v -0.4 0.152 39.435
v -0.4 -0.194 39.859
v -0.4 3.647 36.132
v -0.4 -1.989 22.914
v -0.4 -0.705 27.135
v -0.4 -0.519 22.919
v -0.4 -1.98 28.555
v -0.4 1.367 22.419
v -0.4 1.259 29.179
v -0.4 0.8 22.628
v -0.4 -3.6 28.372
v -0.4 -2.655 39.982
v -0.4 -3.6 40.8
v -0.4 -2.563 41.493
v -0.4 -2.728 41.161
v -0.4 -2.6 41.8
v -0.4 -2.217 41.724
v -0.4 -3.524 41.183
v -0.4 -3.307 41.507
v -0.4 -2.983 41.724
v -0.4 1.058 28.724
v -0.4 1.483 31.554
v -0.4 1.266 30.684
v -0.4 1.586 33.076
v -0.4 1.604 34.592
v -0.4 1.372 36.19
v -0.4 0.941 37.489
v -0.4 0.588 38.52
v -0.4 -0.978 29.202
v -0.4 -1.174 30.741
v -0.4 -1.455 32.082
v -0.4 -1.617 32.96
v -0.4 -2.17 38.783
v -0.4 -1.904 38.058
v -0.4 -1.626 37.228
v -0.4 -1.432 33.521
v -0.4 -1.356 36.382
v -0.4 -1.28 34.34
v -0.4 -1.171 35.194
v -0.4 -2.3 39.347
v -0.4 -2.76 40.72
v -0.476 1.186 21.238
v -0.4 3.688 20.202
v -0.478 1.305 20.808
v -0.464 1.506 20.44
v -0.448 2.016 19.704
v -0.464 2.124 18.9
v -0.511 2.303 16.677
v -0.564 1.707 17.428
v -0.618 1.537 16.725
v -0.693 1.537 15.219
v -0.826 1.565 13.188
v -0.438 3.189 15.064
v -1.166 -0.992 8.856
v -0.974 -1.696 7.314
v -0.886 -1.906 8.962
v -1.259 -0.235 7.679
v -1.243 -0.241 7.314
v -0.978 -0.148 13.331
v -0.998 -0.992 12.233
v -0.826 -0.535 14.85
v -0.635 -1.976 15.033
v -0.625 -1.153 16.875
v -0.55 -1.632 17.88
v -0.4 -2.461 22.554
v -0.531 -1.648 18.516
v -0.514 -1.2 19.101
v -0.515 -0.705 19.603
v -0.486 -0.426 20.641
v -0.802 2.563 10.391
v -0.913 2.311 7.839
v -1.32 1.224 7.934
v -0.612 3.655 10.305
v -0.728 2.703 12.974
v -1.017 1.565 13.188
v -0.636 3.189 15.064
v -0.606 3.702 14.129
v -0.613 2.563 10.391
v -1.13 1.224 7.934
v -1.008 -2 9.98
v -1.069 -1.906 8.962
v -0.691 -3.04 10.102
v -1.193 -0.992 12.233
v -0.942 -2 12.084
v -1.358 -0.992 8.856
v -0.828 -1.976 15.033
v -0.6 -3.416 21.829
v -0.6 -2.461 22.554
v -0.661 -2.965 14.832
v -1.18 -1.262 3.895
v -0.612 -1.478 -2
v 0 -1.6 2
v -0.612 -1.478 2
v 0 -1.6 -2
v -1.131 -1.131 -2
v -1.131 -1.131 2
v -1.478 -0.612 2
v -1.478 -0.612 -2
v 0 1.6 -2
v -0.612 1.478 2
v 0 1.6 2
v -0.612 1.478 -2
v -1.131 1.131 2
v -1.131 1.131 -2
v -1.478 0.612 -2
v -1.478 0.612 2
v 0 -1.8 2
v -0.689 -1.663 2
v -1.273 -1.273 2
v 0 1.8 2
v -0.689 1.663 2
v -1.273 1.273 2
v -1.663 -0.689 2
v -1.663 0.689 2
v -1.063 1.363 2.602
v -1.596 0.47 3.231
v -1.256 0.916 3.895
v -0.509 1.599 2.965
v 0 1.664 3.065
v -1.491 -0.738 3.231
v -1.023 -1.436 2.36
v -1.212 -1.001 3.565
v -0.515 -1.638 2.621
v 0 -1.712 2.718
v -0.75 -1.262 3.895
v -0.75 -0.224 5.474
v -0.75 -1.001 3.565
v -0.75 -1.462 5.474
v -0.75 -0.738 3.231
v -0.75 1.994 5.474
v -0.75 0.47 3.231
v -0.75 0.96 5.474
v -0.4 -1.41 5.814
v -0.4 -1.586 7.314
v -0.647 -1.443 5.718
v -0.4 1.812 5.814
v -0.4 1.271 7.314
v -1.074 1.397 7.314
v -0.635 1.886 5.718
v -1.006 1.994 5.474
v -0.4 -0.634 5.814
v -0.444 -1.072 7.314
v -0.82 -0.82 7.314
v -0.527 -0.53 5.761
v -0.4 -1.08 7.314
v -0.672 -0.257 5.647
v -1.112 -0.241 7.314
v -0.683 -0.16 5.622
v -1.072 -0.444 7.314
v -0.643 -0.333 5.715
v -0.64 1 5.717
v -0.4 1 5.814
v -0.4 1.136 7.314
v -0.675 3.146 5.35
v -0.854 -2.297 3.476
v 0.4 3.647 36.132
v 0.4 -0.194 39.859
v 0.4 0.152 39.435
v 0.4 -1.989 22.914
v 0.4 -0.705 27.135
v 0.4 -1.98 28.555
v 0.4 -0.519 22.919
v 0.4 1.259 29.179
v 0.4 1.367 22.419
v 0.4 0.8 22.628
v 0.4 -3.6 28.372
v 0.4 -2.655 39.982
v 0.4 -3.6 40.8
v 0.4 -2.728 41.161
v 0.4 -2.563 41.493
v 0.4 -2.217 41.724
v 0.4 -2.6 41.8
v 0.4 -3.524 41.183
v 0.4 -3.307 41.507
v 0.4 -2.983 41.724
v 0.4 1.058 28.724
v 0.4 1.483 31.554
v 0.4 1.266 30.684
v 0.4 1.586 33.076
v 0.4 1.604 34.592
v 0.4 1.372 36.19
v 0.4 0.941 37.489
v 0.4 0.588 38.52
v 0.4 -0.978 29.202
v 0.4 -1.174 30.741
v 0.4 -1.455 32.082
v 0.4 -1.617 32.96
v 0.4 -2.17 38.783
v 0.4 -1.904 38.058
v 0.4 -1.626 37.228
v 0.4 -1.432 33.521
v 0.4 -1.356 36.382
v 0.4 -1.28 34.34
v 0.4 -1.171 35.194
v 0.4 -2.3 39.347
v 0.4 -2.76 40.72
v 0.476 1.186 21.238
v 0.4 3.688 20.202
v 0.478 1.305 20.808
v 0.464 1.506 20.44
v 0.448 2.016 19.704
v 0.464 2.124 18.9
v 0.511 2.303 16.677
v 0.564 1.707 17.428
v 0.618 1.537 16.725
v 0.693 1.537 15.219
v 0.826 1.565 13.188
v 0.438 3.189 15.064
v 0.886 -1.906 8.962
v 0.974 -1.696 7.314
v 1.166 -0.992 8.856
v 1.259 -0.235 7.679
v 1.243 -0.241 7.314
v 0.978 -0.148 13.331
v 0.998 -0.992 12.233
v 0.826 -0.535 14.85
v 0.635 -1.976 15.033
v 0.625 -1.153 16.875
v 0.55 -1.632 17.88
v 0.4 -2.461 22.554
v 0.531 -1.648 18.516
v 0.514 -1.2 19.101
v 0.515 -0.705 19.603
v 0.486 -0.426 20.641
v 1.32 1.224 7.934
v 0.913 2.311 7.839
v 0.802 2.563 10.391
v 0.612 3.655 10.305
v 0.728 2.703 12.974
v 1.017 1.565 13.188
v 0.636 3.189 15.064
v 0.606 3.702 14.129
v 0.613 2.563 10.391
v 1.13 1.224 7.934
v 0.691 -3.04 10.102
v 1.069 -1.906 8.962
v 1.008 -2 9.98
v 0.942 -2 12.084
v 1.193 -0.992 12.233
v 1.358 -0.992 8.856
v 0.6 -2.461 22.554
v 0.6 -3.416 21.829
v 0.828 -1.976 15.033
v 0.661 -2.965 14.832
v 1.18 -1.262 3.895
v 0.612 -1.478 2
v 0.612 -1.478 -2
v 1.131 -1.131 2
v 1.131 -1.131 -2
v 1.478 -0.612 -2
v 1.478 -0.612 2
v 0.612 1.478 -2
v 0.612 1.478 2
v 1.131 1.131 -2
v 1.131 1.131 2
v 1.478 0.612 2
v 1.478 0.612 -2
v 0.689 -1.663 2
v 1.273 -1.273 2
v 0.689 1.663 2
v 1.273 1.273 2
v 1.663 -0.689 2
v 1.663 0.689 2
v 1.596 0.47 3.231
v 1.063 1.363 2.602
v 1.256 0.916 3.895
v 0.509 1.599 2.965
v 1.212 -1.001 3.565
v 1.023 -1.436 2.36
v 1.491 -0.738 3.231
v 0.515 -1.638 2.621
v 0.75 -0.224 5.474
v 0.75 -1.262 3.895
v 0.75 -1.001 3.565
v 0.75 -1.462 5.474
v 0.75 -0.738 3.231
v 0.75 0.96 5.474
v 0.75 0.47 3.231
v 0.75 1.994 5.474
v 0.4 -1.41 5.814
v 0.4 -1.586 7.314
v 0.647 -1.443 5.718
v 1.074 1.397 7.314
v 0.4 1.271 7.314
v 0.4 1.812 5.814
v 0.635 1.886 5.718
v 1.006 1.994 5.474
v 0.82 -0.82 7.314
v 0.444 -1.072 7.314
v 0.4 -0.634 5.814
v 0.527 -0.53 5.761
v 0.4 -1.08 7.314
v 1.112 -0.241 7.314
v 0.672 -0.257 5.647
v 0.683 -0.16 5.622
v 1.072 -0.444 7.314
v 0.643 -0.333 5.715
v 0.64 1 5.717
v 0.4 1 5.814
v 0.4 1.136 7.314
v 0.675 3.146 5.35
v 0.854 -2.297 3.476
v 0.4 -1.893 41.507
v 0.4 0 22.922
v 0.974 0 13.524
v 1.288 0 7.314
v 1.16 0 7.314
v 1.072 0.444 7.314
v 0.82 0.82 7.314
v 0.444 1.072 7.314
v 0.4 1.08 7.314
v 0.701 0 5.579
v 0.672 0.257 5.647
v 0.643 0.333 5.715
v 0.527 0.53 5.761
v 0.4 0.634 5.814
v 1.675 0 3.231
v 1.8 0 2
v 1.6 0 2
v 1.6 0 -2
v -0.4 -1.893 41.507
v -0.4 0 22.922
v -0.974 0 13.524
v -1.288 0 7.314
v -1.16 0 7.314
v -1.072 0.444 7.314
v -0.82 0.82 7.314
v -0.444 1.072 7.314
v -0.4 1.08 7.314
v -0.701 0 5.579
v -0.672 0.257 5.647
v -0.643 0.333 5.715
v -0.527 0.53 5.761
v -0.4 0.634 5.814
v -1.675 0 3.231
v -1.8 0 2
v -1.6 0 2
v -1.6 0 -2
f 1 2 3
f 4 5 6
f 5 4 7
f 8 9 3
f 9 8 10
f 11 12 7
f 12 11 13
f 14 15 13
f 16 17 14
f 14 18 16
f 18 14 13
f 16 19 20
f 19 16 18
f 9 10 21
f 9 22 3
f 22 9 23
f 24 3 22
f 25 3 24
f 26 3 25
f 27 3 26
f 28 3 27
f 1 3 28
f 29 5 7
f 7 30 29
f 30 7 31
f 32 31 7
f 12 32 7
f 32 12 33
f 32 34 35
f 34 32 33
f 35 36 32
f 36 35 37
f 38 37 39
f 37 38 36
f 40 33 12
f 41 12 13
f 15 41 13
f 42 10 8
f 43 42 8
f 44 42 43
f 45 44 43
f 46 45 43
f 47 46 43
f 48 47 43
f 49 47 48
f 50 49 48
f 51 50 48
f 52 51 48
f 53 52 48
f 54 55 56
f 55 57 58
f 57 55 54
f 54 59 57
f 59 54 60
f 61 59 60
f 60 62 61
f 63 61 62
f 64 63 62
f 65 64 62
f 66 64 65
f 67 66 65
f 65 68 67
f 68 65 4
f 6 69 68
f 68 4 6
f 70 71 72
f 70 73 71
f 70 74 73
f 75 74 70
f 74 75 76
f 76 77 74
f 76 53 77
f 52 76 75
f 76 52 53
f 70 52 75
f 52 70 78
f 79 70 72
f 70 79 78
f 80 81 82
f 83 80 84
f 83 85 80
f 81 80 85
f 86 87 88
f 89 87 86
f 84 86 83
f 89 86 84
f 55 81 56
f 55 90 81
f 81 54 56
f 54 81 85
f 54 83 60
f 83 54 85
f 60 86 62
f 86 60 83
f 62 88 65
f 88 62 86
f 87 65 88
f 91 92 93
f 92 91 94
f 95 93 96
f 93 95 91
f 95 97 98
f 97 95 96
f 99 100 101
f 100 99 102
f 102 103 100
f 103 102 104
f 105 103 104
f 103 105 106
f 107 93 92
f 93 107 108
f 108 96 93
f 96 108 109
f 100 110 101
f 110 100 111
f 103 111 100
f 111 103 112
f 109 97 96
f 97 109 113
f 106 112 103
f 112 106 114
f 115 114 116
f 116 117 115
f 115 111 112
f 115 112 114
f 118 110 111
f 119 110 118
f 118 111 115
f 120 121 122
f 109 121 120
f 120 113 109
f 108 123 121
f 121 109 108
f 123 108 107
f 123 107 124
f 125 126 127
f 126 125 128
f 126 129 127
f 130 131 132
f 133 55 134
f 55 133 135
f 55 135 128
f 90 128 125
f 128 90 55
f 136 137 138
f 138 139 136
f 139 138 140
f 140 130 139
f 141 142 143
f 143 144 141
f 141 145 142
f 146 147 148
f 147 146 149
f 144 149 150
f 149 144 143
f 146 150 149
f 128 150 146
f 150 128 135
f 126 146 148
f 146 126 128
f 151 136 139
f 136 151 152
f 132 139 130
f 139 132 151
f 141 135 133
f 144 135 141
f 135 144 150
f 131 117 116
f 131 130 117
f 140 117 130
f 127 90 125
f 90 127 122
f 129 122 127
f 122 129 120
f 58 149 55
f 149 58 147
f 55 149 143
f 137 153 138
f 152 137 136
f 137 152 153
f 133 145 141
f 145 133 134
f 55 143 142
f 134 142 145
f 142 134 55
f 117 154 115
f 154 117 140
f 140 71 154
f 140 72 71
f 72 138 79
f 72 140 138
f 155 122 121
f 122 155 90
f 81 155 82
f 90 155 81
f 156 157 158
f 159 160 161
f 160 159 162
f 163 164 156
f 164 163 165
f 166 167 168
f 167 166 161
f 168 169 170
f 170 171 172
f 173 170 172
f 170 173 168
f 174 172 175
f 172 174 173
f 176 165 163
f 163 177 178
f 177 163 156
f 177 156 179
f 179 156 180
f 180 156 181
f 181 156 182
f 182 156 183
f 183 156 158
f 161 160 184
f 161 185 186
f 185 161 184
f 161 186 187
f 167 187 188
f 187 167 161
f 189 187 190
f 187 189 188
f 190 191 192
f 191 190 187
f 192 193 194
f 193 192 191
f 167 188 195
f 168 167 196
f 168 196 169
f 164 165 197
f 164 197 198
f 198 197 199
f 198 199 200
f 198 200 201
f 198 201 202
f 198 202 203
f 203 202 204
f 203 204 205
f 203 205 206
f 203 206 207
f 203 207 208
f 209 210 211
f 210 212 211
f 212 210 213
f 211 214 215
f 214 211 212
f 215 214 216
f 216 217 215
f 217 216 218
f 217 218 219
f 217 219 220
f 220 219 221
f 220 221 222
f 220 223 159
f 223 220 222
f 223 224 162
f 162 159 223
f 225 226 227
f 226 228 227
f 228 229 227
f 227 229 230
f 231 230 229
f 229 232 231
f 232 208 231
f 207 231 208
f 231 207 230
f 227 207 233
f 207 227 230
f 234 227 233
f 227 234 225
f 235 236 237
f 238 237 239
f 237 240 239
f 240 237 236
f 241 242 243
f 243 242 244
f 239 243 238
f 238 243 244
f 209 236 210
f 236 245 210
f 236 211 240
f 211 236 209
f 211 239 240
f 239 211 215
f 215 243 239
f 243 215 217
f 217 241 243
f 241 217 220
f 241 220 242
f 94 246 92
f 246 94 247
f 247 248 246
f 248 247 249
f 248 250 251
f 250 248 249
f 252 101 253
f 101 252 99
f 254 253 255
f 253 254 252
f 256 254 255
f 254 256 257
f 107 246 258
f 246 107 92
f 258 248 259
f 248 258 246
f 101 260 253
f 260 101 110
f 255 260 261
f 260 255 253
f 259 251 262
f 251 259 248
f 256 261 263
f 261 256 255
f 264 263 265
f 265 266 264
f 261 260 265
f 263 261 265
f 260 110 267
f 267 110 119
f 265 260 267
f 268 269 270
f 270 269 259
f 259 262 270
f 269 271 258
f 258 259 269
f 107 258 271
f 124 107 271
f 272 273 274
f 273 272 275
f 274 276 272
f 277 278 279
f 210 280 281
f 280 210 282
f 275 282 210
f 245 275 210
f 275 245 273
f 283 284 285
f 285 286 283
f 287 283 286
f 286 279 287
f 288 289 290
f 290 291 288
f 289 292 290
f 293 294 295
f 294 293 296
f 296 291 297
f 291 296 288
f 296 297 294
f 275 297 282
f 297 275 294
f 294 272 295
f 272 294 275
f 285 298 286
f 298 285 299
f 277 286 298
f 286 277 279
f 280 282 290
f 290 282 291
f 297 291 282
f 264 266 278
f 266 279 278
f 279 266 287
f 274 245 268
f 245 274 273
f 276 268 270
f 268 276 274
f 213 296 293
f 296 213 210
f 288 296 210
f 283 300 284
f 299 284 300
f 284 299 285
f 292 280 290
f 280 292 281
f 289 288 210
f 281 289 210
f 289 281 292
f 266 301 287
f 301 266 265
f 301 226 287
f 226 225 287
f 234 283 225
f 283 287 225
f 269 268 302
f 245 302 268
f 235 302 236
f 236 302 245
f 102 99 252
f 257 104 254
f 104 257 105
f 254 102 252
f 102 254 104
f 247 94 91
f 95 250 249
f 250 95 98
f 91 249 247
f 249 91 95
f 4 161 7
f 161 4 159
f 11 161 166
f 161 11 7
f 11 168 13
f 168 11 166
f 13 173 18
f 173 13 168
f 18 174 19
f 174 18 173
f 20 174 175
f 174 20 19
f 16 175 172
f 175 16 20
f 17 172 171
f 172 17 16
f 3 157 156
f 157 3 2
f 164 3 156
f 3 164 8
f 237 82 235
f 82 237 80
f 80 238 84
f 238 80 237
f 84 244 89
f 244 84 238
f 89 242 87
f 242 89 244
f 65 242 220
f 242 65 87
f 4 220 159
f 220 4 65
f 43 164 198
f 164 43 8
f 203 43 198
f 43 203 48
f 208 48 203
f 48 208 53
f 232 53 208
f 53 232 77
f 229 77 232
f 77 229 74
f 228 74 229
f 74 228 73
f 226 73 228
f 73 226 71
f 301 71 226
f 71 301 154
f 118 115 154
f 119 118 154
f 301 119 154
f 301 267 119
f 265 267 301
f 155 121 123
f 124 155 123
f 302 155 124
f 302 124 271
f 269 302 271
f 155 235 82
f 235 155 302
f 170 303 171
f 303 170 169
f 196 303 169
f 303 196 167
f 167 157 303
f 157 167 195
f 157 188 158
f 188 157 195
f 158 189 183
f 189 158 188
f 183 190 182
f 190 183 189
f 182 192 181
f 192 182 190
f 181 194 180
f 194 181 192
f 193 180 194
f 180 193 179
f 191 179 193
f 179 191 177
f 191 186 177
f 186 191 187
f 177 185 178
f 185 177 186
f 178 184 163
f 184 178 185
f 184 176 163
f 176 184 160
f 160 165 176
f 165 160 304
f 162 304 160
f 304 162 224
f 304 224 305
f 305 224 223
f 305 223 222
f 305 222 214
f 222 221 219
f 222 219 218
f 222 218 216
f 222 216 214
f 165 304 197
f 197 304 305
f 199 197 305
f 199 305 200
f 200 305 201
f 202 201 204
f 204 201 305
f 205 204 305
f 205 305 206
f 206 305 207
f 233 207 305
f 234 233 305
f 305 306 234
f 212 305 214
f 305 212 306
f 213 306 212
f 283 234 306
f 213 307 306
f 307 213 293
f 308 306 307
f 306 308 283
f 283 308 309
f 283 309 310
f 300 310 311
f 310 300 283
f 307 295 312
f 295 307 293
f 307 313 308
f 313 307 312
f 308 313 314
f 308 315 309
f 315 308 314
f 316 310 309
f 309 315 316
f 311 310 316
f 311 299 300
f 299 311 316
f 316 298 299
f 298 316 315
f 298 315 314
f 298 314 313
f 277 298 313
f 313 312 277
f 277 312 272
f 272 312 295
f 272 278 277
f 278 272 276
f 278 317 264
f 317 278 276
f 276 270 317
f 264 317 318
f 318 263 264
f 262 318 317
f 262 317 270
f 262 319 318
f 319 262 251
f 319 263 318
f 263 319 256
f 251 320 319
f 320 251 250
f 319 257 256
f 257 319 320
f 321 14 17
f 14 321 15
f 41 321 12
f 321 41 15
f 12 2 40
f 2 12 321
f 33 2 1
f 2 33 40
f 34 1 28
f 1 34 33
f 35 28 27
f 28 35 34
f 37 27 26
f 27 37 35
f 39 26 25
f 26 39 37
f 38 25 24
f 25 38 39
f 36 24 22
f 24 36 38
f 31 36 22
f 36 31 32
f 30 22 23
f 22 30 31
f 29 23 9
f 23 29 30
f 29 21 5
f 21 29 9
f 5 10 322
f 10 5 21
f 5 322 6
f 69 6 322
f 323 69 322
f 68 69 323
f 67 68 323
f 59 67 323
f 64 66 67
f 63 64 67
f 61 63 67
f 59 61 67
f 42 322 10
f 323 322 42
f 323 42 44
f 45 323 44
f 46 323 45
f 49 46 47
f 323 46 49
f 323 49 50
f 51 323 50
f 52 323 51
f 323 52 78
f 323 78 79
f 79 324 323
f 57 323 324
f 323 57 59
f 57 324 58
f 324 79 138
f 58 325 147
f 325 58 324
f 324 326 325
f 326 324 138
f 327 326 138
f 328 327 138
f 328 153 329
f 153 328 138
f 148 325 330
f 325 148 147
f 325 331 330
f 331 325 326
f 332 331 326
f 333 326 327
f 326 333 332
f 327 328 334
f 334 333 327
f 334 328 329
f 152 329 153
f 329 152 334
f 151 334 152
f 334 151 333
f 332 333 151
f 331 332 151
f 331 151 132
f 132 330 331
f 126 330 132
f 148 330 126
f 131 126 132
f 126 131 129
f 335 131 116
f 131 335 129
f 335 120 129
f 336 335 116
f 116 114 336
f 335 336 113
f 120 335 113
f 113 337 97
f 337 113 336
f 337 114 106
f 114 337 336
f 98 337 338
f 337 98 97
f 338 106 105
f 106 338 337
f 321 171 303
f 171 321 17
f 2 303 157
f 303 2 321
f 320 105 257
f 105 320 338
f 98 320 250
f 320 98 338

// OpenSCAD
use <../lib.scad>
use <s/11439s03.scad>
use <s/11439s04.scad>
function ldraw_lib__11439p01() = [
// 0 Minifig Sword with Jagged Edges with Marbled White Pattern
// 0 Name: 11439p01.dat
// 0 Author: Javier Orquera [kuramapika1]
// 0 !LDRAW_ORG Part UPDATE 2023-03
// 0 !LICENSE Licensed under CC BY 4.0 : see CAreadme.txt
// 
// 0 BFC CERTIFY CCW
  [0,"BFC","CERTIFY"],
  [0,"BFC","CCW"],
// 
// 0 !CATEGORY Minifig Accessory
// 0 !KEYWORDS Bricklink 11439pb01, Rebrickable 11439pat0003, Set 70501, Set 70505
// 0 !KEYWORDS Set 70594, Set 70599, Set 70600, Set 70602, Set 70603, Set 70678
// 0 !KEYWORDS Weapon
// 
// 0 !HISTORY 2023-06-24 [OrionP] Official Update 2023-03
// 
// 
// 1 16 0 0 0 -1 0 0 0 1 0 0 0 1 s\11439s03.dat
  [1,16,0,0,0,-1,0,0,0,1,0,0,0,1, ldraw_lib__s__11439s03()],
// 1 15 0 0 0 1 0 0 0 1 0 0 0 1 s\11439s04.dat
  [1,15,0,0,0,1,0,0,0,1,0,0,0,1, ldraw_lib__s__11439s04()],
];
module ldraw_lib__11439p01(step=0, col=false, unit=2/5, alt=false, line=0.2, solid=!$preview)
    makepoly(ldraw_lib__11439p01(), step=step, col=col, unit=unit, alt=alt, line=line, solid=solid);
ldraw_lib__11439p01(line=0.2);
